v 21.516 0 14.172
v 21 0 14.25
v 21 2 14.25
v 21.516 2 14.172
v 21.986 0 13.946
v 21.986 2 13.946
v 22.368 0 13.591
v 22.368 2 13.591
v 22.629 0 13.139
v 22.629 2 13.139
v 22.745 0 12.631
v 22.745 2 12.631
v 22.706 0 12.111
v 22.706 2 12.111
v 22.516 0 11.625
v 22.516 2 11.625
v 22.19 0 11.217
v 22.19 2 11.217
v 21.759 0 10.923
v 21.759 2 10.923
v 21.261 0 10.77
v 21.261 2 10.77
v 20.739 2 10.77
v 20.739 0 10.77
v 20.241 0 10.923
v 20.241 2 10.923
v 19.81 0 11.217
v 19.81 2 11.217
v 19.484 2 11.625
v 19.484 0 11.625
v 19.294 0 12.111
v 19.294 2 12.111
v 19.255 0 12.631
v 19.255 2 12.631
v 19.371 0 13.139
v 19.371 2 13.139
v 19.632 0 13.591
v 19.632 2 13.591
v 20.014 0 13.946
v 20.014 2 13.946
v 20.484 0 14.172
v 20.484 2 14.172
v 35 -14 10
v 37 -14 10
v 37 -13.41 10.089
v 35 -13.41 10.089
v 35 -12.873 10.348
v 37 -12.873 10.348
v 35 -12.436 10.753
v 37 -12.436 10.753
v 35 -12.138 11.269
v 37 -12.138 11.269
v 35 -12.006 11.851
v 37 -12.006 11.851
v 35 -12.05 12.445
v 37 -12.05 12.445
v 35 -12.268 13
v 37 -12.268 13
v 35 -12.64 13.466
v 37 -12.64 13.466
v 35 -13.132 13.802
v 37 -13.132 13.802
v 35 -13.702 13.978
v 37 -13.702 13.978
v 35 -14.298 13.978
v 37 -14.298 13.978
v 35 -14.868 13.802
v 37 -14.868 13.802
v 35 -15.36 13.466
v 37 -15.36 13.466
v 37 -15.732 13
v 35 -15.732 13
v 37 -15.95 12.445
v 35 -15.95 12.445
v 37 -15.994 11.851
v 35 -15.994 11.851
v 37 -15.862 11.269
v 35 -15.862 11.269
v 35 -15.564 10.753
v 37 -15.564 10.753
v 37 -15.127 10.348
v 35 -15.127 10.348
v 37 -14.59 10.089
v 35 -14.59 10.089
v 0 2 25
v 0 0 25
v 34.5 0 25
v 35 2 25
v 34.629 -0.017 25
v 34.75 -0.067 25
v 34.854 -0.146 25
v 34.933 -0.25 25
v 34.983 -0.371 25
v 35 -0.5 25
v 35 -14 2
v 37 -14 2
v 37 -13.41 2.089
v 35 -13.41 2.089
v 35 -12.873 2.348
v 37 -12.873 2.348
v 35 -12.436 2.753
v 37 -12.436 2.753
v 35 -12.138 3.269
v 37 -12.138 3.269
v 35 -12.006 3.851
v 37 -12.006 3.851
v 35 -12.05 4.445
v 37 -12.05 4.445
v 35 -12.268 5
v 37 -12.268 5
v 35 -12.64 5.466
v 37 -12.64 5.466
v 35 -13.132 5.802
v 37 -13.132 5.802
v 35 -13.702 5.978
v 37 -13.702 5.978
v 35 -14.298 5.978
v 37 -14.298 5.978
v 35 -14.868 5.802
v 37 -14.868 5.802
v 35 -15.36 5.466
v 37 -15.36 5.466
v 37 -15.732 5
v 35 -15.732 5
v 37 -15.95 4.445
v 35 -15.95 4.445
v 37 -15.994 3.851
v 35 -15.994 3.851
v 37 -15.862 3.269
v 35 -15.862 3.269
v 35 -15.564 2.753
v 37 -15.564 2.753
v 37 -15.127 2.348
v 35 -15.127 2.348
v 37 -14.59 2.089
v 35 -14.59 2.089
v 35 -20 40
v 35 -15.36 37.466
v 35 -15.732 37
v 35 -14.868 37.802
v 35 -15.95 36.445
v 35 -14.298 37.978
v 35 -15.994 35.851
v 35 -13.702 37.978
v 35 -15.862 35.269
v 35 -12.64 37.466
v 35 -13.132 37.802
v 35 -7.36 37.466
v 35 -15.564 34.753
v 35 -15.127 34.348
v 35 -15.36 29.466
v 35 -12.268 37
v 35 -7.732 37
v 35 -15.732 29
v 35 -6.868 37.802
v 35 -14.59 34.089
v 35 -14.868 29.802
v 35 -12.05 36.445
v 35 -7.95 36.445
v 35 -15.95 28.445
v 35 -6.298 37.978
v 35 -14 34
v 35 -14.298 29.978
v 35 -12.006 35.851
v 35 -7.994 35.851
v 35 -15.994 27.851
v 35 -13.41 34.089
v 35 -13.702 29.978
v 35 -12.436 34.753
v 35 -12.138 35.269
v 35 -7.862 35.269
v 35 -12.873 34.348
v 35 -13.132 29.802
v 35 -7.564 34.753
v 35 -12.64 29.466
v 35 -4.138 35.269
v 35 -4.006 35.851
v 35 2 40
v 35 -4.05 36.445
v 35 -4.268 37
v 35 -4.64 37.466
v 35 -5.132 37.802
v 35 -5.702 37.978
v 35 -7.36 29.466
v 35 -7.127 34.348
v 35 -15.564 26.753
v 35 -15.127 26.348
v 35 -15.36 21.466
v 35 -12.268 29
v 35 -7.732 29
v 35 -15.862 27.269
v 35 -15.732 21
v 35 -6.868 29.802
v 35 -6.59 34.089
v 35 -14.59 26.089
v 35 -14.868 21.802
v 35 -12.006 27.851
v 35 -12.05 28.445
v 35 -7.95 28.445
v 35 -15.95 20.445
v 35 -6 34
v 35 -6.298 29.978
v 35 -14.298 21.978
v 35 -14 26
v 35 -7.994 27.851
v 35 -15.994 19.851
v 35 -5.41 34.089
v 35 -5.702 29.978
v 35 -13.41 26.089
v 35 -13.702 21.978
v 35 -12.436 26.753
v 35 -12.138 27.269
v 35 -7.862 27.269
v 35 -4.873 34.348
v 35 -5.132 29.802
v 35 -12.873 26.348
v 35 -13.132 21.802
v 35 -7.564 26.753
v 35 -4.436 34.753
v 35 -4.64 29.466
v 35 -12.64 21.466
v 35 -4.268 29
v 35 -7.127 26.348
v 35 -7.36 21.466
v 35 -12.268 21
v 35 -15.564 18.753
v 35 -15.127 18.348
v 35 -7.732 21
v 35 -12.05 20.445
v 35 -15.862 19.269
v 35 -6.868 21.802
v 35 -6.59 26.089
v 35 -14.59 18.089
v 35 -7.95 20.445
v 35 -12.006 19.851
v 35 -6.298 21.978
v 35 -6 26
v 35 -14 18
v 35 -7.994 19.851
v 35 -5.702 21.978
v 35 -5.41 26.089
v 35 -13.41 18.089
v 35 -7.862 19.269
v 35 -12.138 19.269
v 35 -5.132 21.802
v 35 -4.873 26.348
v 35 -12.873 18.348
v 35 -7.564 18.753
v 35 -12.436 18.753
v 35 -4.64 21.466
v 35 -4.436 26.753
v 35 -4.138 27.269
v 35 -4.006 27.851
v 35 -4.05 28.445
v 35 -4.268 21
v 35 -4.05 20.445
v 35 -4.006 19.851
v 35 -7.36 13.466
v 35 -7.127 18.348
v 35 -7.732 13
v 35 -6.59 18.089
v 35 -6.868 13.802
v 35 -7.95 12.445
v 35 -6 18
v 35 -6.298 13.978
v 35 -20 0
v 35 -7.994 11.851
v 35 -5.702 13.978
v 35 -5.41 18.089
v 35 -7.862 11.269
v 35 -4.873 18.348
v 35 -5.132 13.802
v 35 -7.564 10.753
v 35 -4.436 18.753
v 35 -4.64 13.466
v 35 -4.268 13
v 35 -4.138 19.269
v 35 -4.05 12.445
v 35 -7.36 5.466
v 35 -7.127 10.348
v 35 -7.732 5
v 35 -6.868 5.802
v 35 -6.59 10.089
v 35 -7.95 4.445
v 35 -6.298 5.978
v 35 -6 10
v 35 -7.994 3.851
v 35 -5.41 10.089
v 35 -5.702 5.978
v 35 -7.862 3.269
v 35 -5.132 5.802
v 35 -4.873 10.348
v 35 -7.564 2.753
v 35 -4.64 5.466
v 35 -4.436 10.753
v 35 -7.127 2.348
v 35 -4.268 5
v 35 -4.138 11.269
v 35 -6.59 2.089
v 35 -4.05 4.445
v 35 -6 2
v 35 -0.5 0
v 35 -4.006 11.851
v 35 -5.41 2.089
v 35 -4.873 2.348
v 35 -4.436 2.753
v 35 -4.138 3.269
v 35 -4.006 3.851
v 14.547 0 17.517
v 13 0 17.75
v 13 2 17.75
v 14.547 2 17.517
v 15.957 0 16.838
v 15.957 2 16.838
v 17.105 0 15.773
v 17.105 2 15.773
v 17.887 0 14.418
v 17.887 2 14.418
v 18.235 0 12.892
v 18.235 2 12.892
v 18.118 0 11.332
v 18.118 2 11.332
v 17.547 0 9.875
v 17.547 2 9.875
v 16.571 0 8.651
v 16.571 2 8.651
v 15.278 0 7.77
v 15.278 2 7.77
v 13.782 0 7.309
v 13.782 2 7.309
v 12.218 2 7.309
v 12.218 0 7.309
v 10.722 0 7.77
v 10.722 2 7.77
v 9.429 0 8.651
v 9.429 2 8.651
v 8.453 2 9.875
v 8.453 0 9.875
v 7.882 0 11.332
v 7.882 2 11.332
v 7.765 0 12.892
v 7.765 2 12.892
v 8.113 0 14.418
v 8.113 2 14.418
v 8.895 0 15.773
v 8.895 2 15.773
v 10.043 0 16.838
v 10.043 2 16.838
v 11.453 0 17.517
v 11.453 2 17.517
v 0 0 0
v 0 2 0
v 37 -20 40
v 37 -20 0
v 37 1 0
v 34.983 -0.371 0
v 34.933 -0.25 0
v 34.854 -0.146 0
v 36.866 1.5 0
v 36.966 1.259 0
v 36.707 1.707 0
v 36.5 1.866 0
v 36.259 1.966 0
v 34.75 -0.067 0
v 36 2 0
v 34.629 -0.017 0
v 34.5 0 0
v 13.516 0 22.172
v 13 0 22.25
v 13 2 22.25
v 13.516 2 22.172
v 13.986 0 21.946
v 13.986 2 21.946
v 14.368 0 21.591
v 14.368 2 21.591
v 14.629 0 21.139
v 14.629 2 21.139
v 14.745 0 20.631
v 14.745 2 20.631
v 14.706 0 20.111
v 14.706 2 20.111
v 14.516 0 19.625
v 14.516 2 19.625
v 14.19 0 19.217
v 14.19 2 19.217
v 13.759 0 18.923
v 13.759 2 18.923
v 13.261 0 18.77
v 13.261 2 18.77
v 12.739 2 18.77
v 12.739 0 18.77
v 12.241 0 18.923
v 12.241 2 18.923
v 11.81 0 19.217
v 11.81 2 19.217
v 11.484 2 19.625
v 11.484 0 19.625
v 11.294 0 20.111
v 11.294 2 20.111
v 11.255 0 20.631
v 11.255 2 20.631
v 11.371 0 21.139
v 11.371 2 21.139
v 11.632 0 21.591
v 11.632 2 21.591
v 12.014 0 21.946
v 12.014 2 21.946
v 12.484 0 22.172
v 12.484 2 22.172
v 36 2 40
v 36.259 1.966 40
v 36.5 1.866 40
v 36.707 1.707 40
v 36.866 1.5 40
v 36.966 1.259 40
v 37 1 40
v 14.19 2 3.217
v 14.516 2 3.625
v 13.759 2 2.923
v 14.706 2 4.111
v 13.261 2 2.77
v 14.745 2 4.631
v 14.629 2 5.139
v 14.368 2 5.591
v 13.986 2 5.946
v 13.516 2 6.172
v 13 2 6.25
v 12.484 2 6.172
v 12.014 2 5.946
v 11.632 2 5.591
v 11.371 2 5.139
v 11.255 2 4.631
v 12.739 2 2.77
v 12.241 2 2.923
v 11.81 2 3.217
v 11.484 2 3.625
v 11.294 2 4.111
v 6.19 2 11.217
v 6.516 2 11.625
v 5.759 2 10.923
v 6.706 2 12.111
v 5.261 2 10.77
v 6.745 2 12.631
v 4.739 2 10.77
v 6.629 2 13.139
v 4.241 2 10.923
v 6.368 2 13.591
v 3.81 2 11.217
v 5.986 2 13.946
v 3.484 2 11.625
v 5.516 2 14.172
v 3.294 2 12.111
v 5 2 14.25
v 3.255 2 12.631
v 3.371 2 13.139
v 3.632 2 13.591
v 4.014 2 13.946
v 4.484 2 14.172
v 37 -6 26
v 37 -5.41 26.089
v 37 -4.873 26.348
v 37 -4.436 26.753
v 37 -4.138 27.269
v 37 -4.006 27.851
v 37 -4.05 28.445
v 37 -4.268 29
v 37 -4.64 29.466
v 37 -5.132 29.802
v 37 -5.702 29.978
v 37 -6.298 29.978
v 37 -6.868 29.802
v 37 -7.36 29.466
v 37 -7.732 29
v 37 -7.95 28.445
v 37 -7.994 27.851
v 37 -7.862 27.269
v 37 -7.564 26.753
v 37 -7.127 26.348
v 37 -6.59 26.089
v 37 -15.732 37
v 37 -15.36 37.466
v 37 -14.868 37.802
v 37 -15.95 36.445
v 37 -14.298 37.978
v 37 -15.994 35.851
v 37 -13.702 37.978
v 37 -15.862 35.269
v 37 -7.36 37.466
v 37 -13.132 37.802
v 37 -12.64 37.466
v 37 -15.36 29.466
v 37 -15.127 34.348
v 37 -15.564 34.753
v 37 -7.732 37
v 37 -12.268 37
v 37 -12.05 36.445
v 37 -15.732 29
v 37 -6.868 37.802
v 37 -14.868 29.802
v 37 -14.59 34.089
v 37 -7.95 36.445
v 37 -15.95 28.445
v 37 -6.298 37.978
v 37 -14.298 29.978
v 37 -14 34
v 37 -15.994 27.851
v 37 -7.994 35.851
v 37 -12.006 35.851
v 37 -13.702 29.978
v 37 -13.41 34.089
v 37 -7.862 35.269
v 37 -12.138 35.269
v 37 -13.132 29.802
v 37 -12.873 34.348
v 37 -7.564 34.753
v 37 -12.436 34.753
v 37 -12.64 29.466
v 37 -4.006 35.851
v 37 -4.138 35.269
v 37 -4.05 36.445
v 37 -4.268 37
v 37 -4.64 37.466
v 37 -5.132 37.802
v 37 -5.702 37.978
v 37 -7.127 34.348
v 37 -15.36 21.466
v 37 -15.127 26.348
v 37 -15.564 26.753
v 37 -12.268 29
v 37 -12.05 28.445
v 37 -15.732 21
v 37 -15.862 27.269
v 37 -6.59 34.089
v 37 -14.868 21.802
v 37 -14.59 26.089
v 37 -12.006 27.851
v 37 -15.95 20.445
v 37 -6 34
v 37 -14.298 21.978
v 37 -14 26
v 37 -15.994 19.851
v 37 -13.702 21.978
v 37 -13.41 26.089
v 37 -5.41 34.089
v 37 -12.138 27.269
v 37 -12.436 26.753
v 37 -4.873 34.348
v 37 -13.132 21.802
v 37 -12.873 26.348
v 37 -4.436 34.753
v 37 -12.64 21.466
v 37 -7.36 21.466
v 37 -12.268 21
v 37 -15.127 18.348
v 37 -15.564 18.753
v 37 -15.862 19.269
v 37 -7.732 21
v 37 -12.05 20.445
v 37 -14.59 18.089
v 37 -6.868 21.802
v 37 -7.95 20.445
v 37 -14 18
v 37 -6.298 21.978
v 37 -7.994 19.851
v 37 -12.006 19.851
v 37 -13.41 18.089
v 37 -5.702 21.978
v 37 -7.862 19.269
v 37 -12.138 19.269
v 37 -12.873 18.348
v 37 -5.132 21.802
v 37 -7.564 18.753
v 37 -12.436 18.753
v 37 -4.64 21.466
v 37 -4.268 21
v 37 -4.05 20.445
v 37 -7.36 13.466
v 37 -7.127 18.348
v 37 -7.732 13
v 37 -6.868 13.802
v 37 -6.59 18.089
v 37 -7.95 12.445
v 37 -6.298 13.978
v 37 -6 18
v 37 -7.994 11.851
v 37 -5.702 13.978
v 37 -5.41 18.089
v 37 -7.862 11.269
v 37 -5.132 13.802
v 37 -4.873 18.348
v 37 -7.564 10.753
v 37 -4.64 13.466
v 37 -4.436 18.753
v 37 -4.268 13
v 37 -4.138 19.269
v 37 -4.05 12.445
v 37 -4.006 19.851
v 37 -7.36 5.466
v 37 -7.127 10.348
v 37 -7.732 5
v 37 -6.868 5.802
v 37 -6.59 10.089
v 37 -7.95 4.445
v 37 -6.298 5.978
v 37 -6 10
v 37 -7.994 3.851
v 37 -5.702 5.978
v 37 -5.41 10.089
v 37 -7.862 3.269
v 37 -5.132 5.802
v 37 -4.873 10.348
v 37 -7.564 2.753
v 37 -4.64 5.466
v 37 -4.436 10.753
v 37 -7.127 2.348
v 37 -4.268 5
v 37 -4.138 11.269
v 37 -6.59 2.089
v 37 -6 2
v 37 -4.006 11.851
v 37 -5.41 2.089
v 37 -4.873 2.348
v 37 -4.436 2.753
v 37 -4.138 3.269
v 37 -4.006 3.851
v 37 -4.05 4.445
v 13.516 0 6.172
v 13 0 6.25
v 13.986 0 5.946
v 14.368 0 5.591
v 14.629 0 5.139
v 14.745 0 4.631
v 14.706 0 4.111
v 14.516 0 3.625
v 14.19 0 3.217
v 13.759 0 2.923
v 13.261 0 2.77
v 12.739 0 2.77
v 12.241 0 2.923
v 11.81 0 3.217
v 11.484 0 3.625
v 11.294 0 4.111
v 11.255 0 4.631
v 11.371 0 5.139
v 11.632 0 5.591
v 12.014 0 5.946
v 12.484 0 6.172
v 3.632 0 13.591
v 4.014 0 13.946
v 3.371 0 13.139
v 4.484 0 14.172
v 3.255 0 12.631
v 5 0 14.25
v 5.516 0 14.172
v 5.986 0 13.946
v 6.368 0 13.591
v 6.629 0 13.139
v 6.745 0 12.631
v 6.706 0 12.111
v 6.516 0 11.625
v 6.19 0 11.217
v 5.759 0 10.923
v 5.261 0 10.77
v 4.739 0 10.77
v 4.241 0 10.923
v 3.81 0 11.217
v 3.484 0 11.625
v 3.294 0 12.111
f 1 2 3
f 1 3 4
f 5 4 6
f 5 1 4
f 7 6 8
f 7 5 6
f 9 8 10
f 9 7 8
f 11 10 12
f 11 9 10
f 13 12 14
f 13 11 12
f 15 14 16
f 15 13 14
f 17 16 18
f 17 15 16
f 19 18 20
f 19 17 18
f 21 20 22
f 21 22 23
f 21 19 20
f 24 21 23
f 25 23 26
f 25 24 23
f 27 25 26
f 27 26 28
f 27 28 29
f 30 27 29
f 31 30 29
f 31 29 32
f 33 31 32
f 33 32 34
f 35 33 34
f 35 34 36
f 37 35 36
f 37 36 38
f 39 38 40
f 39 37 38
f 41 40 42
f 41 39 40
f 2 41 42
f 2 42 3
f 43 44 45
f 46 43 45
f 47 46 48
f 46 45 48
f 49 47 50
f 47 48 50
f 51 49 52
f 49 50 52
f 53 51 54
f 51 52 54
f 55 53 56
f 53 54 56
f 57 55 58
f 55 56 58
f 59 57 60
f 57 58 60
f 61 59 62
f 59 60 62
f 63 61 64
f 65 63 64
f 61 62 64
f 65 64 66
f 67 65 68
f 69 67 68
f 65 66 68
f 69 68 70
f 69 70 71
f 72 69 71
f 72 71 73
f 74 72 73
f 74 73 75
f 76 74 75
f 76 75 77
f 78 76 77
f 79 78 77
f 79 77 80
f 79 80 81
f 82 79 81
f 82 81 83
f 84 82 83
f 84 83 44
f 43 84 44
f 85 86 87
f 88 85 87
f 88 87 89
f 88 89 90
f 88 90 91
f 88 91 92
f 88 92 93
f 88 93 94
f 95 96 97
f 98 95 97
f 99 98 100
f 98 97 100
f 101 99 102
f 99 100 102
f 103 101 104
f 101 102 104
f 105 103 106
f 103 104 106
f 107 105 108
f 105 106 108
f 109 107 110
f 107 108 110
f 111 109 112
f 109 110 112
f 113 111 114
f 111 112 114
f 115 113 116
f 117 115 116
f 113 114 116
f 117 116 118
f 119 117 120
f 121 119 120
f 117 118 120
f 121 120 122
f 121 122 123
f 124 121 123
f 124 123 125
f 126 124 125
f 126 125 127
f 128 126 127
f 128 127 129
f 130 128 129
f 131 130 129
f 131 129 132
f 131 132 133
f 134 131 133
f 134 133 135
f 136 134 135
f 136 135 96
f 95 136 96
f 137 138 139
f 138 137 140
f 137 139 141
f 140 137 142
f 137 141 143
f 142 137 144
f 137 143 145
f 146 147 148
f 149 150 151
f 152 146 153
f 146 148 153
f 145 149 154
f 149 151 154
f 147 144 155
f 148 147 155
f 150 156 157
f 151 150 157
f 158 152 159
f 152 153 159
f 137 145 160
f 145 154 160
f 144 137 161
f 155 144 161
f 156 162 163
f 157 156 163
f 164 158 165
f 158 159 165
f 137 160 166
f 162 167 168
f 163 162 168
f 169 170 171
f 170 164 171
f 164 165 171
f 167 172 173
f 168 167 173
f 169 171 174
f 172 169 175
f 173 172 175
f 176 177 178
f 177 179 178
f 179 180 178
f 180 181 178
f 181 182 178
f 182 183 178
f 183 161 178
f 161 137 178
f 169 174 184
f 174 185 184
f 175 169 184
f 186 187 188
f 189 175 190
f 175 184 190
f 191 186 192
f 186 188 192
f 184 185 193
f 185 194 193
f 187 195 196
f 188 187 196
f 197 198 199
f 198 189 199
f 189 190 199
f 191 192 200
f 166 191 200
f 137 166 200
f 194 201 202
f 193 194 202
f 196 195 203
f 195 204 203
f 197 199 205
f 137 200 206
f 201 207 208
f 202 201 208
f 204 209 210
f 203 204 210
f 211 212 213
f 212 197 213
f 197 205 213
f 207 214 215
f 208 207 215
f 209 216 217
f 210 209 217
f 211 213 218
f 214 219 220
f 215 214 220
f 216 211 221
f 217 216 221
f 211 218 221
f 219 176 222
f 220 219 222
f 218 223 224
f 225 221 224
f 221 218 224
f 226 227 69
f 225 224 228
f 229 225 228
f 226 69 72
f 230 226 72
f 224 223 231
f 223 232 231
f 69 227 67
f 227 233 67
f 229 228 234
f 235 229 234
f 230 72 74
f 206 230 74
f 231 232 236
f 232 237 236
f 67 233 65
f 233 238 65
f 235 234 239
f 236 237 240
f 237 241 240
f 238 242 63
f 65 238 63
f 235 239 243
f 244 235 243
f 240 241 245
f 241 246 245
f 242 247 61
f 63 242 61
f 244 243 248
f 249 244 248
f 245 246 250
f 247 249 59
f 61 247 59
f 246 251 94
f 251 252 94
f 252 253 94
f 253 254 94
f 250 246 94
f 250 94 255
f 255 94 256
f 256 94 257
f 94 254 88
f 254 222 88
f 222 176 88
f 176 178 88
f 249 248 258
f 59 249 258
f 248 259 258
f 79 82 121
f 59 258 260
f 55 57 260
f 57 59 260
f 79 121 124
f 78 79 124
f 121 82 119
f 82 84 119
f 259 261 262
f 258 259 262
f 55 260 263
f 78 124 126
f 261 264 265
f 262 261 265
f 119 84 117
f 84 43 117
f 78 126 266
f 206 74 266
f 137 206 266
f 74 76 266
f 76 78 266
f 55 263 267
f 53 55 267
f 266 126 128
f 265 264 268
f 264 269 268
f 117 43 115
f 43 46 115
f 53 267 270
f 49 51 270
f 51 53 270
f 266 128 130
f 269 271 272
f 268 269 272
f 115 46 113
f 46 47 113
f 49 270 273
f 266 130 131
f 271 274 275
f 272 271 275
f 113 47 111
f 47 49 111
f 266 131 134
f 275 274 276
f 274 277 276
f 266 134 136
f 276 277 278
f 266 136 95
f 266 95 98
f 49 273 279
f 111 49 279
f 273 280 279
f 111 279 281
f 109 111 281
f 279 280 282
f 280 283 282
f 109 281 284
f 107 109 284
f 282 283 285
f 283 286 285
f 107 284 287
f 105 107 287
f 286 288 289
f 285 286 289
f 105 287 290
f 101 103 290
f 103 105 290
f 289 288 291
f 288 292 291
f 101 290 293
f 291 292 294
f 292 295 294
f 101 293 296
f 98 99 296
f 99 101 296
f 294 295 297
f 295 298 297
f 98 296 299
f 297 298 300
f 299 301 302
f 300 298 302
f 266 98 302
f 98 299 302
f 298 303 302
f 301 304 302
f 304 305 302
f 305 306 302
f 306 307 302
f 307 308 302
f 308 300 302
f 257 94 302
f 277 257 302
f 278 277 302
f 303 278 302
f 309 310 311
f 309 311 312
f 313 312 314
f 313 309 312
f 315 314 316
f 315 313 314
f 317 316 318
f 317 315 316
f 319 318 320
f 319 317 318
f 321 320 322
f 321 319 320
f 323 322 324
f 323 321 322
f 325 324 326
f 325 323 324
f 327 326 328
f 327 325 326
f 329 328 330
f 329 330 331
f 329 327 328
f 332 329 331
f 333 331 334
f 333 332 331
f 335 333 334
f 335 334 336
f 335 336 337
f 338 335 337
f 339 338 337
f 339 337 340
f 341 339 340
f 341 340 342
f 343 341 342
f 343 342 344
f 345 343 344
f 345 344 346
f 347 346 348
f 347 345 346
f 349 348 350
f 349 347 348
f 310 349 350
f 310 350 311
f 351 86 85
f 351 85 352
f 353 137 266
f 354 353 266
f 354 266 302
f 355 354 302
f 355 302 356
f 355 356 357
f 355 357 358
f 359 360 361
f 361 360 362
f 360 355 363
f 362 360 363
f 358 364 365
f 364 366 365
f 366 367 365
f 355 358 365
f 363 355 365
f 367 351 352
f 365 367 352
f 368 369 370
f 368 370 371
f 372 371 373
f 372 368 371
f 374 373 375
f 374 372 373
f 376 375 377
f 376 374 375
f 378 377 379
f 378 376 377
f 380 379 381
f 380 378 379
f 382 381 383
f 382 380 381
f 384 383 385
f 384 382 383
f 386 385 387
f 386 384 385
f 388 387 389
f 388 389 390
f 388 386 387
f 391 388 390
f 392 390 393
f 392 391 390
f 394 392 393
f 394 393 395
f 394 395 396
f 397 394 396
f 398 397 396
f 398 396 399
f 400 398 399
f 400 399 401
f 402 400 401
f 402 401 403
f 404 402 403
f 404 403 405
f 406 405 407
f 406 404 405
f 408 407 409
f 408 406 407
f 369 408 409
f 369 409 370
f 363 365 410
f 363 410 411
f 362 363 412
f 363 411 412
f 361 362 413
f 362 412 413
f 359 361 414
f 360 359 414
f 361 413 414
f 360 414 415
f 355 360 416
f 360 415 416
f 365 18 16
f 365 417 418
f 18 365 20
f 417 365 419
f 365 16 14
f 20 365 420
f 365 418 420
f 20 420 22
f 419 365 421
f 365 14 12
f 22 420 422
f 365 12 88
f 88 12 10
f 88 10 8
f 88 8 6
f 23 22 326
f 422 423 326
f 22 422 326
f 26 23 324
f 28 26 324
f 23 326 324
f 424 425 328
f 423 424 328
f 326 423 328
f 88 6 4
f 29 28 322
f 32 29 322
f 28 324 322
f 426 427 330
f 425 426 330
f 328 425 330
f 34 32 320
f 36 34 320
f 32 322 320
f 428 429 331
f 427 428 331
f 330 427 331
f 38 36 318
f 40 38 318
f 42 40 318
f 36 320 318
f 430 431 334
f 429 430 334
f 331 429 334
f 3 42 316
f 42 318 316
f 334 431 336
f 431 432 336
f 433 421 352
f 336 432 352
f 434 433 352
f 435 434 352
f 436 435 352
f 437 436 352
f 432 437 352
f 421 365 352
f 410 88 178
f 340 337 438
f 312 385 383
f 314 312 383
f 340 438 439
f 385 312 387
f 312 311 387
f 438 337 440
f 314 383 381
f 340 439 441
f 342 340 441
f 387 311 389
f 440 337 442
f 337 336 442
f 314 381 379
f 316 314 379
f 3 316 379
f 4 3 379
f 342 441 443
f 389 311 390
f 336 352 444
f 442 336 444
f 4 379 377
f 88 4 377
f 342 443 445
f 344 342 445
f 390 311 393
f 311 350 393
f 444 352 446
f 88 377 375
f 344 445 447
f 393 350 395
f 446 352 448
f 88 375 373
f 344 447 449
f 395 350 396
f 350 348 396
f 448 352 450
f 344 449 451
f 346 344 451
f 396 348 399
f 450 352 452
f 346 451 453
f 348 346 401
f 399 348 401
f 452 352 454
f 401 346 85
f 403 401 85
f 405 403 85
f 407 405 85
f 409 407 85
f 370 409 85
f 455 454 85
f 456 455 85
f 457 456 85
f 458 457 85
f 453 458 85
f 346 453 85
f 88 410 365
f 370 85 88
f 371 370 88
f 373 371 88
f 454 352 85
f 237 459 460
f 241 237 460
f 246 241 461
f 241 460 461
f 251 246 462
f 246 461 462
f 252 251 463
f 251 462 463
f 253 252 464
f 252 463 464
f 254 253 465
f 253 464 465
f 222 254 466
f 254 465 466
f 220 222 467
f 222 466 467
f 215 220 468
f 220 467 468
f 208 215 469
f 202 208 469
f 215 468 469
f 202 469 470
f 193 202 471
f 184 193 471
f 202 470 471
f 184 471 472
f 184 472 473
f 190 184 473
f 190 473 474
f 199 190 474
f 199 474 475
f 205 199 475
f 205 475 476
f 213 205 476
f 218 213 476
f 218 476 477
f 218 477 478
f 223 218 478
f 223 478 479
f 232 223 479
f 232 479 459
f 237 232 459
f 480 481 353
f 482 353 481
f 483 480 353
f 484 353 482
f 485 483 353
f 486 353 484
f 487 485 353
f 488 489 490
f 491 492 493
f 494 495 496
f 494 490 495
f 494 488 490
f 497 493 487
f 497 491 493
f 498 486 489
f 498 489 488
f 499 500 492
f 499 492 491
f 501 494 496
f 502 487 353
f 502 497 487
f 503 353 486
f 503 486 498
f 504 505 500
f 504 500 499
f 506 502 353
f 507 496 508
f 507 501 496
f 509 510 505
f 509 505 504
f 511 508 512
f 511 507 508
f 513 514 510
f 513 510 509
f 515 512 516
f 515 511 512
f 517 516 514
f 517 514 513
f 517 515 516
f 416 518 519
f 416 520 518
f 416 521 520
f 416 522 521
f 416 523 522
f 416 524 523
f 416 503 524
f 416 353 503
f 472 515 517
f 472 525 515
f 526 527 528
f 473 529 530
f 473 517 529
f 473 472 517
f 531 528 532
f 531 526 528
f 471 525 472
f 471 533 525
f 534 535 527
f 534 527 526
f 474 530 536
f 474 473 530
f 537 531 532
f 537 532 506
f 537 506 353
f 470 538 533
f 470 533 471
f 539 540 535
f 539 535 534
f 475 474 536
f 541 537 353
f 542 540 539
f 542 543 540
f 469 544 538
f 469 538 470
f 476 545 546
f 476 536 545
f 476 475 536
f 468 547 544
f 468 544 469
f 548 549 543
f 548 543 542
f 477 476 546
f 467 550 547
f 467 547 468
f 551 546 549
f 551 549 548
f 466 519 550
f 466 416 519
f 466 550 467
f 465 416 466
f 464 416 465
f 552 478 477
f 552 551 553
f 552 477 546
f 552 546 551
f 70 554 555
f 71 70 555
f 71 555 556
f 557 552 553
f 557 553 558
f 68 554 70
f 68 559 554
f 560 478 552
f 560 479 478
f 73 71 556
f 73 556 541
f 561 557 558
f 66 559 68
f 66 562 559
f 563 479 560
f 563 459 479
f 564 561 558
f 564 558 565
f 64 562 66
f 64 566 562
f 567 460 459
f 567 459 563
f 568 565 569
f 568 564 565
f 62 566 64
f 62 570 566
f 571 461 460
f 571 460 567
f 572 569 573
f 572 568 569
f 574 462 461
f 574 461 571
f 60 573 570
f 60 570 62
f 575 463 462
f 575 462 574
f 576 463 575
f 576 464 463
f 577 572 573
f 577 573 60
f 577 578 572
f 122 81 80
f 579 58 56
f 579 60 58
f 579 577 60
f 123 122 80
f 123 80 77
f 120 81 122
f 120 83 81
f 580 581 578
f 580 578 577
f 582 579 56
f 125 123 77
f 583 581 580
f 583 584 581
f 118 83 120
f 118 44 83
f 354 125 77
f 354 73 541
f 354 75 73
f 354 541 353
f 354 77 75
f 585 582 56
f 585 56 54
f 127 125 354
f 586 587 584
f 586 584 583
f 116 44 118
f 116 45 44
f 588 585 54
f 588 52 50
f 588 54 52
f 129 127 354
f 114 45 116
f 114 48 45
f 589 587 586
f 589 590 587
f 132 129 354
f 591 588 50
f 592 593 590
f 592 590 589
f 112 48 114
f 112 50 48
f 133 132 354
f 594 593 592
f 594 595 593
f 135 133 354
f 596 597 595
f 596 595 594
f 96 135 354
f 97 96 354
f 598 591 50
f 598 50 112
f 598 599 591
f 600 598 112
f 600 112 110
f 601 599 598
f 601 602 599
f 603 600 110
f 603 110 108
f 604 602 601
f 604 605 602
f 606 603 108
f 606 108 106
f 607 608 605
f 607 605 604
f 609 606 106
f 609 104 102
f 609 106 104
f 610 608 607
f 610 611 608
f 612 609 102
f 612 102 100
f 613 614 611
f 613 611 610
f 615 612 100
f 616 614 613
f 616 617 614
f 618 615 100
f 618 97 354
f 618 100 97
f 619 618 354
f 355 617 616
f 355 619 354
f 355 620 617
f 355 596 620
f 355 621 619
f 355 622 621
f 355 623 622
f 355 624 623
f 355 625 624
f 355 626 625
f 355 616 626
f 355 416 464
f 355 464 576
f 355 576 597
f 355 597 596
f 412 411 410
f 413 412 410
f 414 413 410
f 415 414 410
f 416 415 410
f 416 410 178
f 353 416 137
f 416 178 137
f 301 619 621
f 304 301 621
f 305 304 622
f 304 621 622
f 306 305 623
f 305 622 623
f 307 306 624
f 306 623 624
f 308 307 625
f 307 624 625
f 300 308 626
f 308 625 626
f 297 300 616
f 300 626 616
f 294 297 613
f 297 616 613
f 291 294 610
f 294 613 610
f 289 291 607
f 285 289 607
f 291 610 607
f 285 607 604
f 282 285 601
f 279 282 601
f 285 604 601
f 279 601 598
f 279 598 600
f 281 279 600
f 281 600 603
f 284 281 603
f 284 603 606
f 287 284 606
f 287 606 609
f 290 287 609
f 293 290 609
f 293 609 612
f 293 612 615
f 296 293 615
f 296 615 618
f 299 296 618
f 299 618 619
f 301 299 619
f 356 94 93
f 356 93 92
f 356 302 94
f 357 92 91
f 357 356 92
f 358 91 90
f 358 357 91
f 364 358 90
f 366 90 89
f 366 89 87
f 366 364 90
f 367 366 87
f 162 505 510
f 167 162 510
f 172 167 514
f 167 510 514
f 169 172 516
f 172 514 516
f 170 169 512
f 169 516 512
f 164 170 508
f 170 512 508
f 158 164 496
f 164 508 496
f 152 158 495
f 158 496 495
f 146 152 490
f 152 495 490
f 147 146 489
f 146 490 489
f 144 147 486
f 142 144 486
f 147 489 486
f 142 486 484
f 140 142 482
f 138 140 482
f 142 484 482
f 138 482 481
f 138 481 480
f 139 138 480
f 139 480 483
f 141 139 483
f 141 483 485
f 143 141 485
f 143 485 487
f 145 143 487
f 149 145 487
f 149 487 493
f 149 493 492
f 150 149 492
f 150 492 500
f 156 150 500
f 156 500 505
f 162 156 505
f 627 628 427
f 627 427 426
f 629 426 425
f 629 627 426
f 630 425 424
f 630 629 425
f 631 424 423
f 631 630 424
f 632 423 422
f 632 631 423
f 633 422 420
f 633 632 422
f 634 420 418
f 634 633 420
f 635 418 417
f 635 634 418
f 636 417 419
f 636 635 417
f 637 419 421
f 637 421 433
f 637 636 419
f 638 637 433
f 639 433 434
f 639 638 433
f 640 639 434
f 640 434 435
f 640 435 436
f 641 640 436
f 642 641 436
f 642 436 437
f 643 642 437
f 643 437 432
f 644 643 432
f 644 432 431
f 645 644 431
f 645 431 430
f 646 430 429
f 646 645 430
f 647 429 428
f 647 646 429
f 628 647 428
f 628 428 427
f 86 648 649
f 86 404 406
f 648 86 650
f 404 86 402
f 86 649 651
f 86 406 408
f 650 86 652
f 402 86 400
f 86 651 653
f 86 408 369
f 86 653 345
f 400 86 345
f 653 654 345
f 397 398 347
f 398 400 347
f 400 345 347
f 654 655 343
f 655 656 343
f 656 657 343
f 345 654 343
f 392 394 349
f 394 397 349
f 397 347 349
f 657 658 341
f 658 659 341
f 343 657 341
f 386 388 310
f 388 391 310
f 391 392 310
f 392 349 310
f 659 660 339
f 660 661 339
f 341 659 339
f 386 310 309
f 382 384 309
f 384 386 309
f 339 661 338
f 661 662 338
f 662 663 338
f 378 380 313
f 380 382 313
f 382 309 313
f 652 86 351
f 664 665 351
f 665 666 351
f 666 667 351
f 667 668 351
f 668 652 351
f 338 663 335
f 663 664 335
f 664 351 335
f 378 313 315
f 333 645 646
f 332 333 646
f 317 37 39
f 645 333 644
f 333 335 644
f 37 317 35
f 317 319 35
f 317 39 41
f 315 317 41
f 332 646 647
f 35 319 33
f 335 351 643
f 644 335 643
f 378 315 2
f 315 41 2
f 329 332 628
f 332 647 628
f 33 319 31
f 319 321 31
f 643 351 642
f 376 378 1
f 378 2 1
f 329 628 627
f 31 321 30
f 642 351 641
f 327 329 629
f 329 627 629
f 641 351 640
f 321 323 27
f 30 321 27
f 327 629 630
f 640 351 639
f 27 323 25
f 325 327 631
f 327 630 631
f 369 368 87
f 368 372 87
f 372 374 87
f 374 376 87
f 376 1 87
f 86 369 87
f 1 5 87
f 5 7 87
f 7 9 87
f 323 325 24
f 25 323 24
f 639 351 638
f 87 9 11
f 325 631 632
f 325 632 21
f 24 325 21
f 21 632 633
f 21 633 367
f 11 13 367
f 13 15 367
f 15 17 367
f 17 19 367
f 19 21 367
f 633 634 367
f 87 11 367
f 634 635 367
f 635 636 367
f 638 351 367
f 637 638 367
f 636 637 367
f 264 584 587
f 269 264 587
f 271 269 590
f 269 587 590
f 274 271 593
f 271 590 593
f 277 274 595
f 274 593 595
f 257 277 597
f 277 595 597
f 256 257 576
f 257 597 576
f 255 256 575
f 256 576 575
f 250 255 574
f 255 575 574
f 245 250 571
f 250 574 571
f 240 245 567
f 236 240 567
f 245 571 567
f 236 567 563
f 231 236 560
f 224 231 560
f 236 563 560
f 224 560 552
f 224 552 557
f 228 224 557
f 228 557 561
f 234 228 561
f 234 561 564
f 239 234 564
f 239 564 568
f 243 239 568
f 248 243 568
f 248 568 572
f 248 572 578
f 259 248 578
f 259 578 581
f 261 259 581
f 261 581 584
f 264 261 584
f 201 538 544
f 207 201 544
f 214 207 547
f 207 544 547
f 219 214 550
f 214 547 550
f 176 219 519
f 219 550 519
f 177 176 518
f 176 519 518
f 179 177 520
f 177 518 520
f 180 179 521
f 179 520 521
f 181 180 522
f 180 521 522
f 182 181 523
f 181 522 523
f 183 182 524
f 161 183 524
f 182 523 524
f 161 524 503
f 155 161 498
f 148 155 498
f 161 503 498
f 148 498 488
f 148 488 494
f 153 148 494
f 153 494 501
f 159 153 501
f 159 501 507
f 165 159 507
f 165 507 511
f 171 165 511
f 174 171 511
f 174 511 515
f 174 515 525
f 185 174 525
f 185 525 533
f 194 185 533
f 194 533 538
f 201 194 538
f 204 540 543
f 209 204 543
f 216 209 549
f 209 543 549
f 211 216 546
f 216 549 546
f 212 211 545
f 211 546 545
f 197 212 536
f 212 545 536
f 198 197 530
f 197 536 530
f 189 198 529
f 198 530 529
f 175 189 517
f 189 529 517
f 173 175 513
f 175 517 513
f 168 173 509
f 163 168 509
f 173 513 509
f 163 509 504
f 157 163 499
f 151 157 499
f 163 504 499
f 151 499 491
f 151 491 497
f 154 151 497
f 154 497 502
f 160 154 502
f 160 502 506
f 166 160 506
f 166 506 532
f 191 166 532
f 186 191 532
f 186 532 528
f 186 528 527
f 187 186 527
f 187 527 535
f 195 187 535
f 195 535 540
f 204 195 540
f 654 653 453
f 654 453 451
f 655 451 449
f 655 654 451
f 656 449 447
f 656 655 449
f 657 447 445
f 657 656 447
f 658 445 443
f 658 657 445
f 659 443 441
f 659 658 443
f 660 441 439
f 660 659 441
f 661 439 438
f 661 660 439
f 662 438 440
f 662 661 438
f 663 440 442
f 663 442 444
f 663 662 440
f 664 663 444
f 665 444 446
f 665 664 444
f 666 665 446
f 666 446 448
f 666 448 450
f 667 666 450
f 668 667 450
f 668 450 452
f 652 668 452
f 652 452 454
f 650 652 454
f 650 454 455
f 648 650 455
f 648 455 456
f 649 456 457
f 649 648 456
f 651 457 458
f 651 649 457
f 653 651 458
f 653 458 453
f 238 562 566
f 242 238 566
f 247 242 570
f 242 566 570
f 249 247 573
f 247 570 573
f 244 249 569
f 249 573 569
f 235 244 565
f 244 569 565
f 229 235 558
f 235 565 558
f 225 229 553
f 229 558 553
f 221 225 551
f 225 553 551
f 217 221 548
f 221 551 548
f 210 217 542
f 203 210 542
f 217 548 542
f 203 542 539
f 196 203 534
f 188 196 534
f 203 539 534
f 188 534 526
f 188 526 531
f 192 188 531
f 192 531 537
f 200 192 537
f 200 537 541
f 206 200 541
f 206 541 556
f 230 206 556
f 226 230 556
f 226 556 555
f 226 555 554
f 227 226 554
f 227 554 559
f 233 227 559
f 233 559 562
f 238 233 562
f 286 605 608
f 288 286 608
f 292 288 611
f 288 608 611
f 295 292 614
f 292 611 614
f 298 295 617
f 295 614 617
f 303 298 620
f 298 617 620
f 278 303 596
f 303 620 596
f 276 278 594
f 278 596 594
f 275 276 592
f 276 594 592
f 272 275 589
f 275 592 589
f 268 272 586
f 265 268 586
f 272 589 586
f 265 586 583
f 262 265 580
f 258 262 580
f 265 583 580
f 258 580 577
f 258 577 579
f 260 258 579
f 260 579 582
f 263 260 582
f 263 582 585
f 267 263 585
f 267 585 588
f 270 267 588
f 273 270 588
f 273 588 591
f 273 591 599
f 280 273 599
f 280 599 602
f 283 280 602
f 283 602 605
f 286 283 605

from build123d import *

# Parameters (mm, degrees)
SKETCH1_W           = 35
SKETCH1_H           = 25
SKETCH1_R           = 5.25
SKETCH1_R_2         = 1.75
BOSS_EXTRUDE1_DEPTH = 2
BOSS_EXTRUDE2_DEPTH = 2
SKETCH3_R           = 2
CUT_EXTRUDE1_DEPTH  = 59.043087444
FILLET1_R           = 1
FILLET2_R           = 0.5


with BuildPart() as part:
    # Sketch1 → Boss-Extrude1 (new body)
    with BuildSketch(Plane(origin=(0, 0, 0), x_dir=(1, 0, 0), z_dir=(0, 1, 0))):
        with Locations((17.5, -12.5)):
            Rectangle(SKETCH1_W, SKETCH1_H)
        with Locations(Location((13, -12.5, 0), (0, 0, 270))):
            Circle(SKETCH1_R, mode=Mode.SUBTRACT)
        with Locations(Location((13, -4.5, 0), (0, 0, 270))):
            Circle(SKETCH1_R_2, mode=Mode.SUBTRACT)
        with Locations(Location((21, -12.5, 0), (0, 0, 270))):
            Circle(SKETCH1_R_2, mode=Mode.SUBTRACT)
        with Locations(Location((13, -20.5, 0), (0, 0, 270))):
            Circle(SKETCH1_R_2, mode=Mode.SUBTRACT)
        with Locations(Location((5, -12.5, 0), (0, 0, 270))):
            Circle(SKETCH1_R_2, mode=Mode.SUBTRACT)
    extrude(amount=BOSS_EXTRUDE1_DEPTH)

    # Sketch2 → Boss-Extrude2 (add)
    with BuildSketch(Plane(origin=(35, 0, 0), x_dir=(0, 0, -1), z_dir=(1, 0, 0))):
        Polygon((-25, 2), (-40, 2), (-40, -20), (0, -20), (0, 2), align=None)
    extrude(amount=BOSS_EXTRUDE2_DEPTH)

    # Sketch3 → Cut-Extrude1 (cut, through all)
    with BuildSketch(Plane(origin=(37, 0, 0), x_dir=(0, 0, -1), z_dir=(1, 0, 0))):
        with Locations((-20, -6)):
            Circle(SKETCH3_R)
        with Locations((-12, -6)):
            Circle(SKETCH3_R)
        with Locations((-4, -6)):
            Circle(SKETCH3_R)
        with Locations((-28, -6)):
            Circle(SKETCH3_R)
        with Locations((-36, -6)):
            Circle(SKETCH3_R)
        with Locations((-36, -14)):
            Circle(SKETCH3_R)
        with Locations((-28, -14)):
            Circle(SKETCH3_R)
        with Locations((-20, -14)):
            Circle(SKETCH3_R)
        with Locations((-12, -14)):
            Circle(SKETCH3_R)
        with Locations((-4, -14)):
            Circle(SKETCH3_R)
    extrude(amount=-CUT_EXTRUDE1_DEPTH, mode=Mode.SUBTRACT)

    # Fillet1
    fillet1_edges = [part.edges().sort_by_distance(p)[0] for p in [
        (37, 2, 20),
    ]]
    fillet(fillet1_edges, radius=FILLET1_R)

    # Fillet2
    fillet2_edges = [part.edges().sort_by_distance(p)[0] for p in [
        (35, 0, 12.5),
    ]]
    fillet(fillet2_edges, radius=FILLET2_R)


solid = part.part
